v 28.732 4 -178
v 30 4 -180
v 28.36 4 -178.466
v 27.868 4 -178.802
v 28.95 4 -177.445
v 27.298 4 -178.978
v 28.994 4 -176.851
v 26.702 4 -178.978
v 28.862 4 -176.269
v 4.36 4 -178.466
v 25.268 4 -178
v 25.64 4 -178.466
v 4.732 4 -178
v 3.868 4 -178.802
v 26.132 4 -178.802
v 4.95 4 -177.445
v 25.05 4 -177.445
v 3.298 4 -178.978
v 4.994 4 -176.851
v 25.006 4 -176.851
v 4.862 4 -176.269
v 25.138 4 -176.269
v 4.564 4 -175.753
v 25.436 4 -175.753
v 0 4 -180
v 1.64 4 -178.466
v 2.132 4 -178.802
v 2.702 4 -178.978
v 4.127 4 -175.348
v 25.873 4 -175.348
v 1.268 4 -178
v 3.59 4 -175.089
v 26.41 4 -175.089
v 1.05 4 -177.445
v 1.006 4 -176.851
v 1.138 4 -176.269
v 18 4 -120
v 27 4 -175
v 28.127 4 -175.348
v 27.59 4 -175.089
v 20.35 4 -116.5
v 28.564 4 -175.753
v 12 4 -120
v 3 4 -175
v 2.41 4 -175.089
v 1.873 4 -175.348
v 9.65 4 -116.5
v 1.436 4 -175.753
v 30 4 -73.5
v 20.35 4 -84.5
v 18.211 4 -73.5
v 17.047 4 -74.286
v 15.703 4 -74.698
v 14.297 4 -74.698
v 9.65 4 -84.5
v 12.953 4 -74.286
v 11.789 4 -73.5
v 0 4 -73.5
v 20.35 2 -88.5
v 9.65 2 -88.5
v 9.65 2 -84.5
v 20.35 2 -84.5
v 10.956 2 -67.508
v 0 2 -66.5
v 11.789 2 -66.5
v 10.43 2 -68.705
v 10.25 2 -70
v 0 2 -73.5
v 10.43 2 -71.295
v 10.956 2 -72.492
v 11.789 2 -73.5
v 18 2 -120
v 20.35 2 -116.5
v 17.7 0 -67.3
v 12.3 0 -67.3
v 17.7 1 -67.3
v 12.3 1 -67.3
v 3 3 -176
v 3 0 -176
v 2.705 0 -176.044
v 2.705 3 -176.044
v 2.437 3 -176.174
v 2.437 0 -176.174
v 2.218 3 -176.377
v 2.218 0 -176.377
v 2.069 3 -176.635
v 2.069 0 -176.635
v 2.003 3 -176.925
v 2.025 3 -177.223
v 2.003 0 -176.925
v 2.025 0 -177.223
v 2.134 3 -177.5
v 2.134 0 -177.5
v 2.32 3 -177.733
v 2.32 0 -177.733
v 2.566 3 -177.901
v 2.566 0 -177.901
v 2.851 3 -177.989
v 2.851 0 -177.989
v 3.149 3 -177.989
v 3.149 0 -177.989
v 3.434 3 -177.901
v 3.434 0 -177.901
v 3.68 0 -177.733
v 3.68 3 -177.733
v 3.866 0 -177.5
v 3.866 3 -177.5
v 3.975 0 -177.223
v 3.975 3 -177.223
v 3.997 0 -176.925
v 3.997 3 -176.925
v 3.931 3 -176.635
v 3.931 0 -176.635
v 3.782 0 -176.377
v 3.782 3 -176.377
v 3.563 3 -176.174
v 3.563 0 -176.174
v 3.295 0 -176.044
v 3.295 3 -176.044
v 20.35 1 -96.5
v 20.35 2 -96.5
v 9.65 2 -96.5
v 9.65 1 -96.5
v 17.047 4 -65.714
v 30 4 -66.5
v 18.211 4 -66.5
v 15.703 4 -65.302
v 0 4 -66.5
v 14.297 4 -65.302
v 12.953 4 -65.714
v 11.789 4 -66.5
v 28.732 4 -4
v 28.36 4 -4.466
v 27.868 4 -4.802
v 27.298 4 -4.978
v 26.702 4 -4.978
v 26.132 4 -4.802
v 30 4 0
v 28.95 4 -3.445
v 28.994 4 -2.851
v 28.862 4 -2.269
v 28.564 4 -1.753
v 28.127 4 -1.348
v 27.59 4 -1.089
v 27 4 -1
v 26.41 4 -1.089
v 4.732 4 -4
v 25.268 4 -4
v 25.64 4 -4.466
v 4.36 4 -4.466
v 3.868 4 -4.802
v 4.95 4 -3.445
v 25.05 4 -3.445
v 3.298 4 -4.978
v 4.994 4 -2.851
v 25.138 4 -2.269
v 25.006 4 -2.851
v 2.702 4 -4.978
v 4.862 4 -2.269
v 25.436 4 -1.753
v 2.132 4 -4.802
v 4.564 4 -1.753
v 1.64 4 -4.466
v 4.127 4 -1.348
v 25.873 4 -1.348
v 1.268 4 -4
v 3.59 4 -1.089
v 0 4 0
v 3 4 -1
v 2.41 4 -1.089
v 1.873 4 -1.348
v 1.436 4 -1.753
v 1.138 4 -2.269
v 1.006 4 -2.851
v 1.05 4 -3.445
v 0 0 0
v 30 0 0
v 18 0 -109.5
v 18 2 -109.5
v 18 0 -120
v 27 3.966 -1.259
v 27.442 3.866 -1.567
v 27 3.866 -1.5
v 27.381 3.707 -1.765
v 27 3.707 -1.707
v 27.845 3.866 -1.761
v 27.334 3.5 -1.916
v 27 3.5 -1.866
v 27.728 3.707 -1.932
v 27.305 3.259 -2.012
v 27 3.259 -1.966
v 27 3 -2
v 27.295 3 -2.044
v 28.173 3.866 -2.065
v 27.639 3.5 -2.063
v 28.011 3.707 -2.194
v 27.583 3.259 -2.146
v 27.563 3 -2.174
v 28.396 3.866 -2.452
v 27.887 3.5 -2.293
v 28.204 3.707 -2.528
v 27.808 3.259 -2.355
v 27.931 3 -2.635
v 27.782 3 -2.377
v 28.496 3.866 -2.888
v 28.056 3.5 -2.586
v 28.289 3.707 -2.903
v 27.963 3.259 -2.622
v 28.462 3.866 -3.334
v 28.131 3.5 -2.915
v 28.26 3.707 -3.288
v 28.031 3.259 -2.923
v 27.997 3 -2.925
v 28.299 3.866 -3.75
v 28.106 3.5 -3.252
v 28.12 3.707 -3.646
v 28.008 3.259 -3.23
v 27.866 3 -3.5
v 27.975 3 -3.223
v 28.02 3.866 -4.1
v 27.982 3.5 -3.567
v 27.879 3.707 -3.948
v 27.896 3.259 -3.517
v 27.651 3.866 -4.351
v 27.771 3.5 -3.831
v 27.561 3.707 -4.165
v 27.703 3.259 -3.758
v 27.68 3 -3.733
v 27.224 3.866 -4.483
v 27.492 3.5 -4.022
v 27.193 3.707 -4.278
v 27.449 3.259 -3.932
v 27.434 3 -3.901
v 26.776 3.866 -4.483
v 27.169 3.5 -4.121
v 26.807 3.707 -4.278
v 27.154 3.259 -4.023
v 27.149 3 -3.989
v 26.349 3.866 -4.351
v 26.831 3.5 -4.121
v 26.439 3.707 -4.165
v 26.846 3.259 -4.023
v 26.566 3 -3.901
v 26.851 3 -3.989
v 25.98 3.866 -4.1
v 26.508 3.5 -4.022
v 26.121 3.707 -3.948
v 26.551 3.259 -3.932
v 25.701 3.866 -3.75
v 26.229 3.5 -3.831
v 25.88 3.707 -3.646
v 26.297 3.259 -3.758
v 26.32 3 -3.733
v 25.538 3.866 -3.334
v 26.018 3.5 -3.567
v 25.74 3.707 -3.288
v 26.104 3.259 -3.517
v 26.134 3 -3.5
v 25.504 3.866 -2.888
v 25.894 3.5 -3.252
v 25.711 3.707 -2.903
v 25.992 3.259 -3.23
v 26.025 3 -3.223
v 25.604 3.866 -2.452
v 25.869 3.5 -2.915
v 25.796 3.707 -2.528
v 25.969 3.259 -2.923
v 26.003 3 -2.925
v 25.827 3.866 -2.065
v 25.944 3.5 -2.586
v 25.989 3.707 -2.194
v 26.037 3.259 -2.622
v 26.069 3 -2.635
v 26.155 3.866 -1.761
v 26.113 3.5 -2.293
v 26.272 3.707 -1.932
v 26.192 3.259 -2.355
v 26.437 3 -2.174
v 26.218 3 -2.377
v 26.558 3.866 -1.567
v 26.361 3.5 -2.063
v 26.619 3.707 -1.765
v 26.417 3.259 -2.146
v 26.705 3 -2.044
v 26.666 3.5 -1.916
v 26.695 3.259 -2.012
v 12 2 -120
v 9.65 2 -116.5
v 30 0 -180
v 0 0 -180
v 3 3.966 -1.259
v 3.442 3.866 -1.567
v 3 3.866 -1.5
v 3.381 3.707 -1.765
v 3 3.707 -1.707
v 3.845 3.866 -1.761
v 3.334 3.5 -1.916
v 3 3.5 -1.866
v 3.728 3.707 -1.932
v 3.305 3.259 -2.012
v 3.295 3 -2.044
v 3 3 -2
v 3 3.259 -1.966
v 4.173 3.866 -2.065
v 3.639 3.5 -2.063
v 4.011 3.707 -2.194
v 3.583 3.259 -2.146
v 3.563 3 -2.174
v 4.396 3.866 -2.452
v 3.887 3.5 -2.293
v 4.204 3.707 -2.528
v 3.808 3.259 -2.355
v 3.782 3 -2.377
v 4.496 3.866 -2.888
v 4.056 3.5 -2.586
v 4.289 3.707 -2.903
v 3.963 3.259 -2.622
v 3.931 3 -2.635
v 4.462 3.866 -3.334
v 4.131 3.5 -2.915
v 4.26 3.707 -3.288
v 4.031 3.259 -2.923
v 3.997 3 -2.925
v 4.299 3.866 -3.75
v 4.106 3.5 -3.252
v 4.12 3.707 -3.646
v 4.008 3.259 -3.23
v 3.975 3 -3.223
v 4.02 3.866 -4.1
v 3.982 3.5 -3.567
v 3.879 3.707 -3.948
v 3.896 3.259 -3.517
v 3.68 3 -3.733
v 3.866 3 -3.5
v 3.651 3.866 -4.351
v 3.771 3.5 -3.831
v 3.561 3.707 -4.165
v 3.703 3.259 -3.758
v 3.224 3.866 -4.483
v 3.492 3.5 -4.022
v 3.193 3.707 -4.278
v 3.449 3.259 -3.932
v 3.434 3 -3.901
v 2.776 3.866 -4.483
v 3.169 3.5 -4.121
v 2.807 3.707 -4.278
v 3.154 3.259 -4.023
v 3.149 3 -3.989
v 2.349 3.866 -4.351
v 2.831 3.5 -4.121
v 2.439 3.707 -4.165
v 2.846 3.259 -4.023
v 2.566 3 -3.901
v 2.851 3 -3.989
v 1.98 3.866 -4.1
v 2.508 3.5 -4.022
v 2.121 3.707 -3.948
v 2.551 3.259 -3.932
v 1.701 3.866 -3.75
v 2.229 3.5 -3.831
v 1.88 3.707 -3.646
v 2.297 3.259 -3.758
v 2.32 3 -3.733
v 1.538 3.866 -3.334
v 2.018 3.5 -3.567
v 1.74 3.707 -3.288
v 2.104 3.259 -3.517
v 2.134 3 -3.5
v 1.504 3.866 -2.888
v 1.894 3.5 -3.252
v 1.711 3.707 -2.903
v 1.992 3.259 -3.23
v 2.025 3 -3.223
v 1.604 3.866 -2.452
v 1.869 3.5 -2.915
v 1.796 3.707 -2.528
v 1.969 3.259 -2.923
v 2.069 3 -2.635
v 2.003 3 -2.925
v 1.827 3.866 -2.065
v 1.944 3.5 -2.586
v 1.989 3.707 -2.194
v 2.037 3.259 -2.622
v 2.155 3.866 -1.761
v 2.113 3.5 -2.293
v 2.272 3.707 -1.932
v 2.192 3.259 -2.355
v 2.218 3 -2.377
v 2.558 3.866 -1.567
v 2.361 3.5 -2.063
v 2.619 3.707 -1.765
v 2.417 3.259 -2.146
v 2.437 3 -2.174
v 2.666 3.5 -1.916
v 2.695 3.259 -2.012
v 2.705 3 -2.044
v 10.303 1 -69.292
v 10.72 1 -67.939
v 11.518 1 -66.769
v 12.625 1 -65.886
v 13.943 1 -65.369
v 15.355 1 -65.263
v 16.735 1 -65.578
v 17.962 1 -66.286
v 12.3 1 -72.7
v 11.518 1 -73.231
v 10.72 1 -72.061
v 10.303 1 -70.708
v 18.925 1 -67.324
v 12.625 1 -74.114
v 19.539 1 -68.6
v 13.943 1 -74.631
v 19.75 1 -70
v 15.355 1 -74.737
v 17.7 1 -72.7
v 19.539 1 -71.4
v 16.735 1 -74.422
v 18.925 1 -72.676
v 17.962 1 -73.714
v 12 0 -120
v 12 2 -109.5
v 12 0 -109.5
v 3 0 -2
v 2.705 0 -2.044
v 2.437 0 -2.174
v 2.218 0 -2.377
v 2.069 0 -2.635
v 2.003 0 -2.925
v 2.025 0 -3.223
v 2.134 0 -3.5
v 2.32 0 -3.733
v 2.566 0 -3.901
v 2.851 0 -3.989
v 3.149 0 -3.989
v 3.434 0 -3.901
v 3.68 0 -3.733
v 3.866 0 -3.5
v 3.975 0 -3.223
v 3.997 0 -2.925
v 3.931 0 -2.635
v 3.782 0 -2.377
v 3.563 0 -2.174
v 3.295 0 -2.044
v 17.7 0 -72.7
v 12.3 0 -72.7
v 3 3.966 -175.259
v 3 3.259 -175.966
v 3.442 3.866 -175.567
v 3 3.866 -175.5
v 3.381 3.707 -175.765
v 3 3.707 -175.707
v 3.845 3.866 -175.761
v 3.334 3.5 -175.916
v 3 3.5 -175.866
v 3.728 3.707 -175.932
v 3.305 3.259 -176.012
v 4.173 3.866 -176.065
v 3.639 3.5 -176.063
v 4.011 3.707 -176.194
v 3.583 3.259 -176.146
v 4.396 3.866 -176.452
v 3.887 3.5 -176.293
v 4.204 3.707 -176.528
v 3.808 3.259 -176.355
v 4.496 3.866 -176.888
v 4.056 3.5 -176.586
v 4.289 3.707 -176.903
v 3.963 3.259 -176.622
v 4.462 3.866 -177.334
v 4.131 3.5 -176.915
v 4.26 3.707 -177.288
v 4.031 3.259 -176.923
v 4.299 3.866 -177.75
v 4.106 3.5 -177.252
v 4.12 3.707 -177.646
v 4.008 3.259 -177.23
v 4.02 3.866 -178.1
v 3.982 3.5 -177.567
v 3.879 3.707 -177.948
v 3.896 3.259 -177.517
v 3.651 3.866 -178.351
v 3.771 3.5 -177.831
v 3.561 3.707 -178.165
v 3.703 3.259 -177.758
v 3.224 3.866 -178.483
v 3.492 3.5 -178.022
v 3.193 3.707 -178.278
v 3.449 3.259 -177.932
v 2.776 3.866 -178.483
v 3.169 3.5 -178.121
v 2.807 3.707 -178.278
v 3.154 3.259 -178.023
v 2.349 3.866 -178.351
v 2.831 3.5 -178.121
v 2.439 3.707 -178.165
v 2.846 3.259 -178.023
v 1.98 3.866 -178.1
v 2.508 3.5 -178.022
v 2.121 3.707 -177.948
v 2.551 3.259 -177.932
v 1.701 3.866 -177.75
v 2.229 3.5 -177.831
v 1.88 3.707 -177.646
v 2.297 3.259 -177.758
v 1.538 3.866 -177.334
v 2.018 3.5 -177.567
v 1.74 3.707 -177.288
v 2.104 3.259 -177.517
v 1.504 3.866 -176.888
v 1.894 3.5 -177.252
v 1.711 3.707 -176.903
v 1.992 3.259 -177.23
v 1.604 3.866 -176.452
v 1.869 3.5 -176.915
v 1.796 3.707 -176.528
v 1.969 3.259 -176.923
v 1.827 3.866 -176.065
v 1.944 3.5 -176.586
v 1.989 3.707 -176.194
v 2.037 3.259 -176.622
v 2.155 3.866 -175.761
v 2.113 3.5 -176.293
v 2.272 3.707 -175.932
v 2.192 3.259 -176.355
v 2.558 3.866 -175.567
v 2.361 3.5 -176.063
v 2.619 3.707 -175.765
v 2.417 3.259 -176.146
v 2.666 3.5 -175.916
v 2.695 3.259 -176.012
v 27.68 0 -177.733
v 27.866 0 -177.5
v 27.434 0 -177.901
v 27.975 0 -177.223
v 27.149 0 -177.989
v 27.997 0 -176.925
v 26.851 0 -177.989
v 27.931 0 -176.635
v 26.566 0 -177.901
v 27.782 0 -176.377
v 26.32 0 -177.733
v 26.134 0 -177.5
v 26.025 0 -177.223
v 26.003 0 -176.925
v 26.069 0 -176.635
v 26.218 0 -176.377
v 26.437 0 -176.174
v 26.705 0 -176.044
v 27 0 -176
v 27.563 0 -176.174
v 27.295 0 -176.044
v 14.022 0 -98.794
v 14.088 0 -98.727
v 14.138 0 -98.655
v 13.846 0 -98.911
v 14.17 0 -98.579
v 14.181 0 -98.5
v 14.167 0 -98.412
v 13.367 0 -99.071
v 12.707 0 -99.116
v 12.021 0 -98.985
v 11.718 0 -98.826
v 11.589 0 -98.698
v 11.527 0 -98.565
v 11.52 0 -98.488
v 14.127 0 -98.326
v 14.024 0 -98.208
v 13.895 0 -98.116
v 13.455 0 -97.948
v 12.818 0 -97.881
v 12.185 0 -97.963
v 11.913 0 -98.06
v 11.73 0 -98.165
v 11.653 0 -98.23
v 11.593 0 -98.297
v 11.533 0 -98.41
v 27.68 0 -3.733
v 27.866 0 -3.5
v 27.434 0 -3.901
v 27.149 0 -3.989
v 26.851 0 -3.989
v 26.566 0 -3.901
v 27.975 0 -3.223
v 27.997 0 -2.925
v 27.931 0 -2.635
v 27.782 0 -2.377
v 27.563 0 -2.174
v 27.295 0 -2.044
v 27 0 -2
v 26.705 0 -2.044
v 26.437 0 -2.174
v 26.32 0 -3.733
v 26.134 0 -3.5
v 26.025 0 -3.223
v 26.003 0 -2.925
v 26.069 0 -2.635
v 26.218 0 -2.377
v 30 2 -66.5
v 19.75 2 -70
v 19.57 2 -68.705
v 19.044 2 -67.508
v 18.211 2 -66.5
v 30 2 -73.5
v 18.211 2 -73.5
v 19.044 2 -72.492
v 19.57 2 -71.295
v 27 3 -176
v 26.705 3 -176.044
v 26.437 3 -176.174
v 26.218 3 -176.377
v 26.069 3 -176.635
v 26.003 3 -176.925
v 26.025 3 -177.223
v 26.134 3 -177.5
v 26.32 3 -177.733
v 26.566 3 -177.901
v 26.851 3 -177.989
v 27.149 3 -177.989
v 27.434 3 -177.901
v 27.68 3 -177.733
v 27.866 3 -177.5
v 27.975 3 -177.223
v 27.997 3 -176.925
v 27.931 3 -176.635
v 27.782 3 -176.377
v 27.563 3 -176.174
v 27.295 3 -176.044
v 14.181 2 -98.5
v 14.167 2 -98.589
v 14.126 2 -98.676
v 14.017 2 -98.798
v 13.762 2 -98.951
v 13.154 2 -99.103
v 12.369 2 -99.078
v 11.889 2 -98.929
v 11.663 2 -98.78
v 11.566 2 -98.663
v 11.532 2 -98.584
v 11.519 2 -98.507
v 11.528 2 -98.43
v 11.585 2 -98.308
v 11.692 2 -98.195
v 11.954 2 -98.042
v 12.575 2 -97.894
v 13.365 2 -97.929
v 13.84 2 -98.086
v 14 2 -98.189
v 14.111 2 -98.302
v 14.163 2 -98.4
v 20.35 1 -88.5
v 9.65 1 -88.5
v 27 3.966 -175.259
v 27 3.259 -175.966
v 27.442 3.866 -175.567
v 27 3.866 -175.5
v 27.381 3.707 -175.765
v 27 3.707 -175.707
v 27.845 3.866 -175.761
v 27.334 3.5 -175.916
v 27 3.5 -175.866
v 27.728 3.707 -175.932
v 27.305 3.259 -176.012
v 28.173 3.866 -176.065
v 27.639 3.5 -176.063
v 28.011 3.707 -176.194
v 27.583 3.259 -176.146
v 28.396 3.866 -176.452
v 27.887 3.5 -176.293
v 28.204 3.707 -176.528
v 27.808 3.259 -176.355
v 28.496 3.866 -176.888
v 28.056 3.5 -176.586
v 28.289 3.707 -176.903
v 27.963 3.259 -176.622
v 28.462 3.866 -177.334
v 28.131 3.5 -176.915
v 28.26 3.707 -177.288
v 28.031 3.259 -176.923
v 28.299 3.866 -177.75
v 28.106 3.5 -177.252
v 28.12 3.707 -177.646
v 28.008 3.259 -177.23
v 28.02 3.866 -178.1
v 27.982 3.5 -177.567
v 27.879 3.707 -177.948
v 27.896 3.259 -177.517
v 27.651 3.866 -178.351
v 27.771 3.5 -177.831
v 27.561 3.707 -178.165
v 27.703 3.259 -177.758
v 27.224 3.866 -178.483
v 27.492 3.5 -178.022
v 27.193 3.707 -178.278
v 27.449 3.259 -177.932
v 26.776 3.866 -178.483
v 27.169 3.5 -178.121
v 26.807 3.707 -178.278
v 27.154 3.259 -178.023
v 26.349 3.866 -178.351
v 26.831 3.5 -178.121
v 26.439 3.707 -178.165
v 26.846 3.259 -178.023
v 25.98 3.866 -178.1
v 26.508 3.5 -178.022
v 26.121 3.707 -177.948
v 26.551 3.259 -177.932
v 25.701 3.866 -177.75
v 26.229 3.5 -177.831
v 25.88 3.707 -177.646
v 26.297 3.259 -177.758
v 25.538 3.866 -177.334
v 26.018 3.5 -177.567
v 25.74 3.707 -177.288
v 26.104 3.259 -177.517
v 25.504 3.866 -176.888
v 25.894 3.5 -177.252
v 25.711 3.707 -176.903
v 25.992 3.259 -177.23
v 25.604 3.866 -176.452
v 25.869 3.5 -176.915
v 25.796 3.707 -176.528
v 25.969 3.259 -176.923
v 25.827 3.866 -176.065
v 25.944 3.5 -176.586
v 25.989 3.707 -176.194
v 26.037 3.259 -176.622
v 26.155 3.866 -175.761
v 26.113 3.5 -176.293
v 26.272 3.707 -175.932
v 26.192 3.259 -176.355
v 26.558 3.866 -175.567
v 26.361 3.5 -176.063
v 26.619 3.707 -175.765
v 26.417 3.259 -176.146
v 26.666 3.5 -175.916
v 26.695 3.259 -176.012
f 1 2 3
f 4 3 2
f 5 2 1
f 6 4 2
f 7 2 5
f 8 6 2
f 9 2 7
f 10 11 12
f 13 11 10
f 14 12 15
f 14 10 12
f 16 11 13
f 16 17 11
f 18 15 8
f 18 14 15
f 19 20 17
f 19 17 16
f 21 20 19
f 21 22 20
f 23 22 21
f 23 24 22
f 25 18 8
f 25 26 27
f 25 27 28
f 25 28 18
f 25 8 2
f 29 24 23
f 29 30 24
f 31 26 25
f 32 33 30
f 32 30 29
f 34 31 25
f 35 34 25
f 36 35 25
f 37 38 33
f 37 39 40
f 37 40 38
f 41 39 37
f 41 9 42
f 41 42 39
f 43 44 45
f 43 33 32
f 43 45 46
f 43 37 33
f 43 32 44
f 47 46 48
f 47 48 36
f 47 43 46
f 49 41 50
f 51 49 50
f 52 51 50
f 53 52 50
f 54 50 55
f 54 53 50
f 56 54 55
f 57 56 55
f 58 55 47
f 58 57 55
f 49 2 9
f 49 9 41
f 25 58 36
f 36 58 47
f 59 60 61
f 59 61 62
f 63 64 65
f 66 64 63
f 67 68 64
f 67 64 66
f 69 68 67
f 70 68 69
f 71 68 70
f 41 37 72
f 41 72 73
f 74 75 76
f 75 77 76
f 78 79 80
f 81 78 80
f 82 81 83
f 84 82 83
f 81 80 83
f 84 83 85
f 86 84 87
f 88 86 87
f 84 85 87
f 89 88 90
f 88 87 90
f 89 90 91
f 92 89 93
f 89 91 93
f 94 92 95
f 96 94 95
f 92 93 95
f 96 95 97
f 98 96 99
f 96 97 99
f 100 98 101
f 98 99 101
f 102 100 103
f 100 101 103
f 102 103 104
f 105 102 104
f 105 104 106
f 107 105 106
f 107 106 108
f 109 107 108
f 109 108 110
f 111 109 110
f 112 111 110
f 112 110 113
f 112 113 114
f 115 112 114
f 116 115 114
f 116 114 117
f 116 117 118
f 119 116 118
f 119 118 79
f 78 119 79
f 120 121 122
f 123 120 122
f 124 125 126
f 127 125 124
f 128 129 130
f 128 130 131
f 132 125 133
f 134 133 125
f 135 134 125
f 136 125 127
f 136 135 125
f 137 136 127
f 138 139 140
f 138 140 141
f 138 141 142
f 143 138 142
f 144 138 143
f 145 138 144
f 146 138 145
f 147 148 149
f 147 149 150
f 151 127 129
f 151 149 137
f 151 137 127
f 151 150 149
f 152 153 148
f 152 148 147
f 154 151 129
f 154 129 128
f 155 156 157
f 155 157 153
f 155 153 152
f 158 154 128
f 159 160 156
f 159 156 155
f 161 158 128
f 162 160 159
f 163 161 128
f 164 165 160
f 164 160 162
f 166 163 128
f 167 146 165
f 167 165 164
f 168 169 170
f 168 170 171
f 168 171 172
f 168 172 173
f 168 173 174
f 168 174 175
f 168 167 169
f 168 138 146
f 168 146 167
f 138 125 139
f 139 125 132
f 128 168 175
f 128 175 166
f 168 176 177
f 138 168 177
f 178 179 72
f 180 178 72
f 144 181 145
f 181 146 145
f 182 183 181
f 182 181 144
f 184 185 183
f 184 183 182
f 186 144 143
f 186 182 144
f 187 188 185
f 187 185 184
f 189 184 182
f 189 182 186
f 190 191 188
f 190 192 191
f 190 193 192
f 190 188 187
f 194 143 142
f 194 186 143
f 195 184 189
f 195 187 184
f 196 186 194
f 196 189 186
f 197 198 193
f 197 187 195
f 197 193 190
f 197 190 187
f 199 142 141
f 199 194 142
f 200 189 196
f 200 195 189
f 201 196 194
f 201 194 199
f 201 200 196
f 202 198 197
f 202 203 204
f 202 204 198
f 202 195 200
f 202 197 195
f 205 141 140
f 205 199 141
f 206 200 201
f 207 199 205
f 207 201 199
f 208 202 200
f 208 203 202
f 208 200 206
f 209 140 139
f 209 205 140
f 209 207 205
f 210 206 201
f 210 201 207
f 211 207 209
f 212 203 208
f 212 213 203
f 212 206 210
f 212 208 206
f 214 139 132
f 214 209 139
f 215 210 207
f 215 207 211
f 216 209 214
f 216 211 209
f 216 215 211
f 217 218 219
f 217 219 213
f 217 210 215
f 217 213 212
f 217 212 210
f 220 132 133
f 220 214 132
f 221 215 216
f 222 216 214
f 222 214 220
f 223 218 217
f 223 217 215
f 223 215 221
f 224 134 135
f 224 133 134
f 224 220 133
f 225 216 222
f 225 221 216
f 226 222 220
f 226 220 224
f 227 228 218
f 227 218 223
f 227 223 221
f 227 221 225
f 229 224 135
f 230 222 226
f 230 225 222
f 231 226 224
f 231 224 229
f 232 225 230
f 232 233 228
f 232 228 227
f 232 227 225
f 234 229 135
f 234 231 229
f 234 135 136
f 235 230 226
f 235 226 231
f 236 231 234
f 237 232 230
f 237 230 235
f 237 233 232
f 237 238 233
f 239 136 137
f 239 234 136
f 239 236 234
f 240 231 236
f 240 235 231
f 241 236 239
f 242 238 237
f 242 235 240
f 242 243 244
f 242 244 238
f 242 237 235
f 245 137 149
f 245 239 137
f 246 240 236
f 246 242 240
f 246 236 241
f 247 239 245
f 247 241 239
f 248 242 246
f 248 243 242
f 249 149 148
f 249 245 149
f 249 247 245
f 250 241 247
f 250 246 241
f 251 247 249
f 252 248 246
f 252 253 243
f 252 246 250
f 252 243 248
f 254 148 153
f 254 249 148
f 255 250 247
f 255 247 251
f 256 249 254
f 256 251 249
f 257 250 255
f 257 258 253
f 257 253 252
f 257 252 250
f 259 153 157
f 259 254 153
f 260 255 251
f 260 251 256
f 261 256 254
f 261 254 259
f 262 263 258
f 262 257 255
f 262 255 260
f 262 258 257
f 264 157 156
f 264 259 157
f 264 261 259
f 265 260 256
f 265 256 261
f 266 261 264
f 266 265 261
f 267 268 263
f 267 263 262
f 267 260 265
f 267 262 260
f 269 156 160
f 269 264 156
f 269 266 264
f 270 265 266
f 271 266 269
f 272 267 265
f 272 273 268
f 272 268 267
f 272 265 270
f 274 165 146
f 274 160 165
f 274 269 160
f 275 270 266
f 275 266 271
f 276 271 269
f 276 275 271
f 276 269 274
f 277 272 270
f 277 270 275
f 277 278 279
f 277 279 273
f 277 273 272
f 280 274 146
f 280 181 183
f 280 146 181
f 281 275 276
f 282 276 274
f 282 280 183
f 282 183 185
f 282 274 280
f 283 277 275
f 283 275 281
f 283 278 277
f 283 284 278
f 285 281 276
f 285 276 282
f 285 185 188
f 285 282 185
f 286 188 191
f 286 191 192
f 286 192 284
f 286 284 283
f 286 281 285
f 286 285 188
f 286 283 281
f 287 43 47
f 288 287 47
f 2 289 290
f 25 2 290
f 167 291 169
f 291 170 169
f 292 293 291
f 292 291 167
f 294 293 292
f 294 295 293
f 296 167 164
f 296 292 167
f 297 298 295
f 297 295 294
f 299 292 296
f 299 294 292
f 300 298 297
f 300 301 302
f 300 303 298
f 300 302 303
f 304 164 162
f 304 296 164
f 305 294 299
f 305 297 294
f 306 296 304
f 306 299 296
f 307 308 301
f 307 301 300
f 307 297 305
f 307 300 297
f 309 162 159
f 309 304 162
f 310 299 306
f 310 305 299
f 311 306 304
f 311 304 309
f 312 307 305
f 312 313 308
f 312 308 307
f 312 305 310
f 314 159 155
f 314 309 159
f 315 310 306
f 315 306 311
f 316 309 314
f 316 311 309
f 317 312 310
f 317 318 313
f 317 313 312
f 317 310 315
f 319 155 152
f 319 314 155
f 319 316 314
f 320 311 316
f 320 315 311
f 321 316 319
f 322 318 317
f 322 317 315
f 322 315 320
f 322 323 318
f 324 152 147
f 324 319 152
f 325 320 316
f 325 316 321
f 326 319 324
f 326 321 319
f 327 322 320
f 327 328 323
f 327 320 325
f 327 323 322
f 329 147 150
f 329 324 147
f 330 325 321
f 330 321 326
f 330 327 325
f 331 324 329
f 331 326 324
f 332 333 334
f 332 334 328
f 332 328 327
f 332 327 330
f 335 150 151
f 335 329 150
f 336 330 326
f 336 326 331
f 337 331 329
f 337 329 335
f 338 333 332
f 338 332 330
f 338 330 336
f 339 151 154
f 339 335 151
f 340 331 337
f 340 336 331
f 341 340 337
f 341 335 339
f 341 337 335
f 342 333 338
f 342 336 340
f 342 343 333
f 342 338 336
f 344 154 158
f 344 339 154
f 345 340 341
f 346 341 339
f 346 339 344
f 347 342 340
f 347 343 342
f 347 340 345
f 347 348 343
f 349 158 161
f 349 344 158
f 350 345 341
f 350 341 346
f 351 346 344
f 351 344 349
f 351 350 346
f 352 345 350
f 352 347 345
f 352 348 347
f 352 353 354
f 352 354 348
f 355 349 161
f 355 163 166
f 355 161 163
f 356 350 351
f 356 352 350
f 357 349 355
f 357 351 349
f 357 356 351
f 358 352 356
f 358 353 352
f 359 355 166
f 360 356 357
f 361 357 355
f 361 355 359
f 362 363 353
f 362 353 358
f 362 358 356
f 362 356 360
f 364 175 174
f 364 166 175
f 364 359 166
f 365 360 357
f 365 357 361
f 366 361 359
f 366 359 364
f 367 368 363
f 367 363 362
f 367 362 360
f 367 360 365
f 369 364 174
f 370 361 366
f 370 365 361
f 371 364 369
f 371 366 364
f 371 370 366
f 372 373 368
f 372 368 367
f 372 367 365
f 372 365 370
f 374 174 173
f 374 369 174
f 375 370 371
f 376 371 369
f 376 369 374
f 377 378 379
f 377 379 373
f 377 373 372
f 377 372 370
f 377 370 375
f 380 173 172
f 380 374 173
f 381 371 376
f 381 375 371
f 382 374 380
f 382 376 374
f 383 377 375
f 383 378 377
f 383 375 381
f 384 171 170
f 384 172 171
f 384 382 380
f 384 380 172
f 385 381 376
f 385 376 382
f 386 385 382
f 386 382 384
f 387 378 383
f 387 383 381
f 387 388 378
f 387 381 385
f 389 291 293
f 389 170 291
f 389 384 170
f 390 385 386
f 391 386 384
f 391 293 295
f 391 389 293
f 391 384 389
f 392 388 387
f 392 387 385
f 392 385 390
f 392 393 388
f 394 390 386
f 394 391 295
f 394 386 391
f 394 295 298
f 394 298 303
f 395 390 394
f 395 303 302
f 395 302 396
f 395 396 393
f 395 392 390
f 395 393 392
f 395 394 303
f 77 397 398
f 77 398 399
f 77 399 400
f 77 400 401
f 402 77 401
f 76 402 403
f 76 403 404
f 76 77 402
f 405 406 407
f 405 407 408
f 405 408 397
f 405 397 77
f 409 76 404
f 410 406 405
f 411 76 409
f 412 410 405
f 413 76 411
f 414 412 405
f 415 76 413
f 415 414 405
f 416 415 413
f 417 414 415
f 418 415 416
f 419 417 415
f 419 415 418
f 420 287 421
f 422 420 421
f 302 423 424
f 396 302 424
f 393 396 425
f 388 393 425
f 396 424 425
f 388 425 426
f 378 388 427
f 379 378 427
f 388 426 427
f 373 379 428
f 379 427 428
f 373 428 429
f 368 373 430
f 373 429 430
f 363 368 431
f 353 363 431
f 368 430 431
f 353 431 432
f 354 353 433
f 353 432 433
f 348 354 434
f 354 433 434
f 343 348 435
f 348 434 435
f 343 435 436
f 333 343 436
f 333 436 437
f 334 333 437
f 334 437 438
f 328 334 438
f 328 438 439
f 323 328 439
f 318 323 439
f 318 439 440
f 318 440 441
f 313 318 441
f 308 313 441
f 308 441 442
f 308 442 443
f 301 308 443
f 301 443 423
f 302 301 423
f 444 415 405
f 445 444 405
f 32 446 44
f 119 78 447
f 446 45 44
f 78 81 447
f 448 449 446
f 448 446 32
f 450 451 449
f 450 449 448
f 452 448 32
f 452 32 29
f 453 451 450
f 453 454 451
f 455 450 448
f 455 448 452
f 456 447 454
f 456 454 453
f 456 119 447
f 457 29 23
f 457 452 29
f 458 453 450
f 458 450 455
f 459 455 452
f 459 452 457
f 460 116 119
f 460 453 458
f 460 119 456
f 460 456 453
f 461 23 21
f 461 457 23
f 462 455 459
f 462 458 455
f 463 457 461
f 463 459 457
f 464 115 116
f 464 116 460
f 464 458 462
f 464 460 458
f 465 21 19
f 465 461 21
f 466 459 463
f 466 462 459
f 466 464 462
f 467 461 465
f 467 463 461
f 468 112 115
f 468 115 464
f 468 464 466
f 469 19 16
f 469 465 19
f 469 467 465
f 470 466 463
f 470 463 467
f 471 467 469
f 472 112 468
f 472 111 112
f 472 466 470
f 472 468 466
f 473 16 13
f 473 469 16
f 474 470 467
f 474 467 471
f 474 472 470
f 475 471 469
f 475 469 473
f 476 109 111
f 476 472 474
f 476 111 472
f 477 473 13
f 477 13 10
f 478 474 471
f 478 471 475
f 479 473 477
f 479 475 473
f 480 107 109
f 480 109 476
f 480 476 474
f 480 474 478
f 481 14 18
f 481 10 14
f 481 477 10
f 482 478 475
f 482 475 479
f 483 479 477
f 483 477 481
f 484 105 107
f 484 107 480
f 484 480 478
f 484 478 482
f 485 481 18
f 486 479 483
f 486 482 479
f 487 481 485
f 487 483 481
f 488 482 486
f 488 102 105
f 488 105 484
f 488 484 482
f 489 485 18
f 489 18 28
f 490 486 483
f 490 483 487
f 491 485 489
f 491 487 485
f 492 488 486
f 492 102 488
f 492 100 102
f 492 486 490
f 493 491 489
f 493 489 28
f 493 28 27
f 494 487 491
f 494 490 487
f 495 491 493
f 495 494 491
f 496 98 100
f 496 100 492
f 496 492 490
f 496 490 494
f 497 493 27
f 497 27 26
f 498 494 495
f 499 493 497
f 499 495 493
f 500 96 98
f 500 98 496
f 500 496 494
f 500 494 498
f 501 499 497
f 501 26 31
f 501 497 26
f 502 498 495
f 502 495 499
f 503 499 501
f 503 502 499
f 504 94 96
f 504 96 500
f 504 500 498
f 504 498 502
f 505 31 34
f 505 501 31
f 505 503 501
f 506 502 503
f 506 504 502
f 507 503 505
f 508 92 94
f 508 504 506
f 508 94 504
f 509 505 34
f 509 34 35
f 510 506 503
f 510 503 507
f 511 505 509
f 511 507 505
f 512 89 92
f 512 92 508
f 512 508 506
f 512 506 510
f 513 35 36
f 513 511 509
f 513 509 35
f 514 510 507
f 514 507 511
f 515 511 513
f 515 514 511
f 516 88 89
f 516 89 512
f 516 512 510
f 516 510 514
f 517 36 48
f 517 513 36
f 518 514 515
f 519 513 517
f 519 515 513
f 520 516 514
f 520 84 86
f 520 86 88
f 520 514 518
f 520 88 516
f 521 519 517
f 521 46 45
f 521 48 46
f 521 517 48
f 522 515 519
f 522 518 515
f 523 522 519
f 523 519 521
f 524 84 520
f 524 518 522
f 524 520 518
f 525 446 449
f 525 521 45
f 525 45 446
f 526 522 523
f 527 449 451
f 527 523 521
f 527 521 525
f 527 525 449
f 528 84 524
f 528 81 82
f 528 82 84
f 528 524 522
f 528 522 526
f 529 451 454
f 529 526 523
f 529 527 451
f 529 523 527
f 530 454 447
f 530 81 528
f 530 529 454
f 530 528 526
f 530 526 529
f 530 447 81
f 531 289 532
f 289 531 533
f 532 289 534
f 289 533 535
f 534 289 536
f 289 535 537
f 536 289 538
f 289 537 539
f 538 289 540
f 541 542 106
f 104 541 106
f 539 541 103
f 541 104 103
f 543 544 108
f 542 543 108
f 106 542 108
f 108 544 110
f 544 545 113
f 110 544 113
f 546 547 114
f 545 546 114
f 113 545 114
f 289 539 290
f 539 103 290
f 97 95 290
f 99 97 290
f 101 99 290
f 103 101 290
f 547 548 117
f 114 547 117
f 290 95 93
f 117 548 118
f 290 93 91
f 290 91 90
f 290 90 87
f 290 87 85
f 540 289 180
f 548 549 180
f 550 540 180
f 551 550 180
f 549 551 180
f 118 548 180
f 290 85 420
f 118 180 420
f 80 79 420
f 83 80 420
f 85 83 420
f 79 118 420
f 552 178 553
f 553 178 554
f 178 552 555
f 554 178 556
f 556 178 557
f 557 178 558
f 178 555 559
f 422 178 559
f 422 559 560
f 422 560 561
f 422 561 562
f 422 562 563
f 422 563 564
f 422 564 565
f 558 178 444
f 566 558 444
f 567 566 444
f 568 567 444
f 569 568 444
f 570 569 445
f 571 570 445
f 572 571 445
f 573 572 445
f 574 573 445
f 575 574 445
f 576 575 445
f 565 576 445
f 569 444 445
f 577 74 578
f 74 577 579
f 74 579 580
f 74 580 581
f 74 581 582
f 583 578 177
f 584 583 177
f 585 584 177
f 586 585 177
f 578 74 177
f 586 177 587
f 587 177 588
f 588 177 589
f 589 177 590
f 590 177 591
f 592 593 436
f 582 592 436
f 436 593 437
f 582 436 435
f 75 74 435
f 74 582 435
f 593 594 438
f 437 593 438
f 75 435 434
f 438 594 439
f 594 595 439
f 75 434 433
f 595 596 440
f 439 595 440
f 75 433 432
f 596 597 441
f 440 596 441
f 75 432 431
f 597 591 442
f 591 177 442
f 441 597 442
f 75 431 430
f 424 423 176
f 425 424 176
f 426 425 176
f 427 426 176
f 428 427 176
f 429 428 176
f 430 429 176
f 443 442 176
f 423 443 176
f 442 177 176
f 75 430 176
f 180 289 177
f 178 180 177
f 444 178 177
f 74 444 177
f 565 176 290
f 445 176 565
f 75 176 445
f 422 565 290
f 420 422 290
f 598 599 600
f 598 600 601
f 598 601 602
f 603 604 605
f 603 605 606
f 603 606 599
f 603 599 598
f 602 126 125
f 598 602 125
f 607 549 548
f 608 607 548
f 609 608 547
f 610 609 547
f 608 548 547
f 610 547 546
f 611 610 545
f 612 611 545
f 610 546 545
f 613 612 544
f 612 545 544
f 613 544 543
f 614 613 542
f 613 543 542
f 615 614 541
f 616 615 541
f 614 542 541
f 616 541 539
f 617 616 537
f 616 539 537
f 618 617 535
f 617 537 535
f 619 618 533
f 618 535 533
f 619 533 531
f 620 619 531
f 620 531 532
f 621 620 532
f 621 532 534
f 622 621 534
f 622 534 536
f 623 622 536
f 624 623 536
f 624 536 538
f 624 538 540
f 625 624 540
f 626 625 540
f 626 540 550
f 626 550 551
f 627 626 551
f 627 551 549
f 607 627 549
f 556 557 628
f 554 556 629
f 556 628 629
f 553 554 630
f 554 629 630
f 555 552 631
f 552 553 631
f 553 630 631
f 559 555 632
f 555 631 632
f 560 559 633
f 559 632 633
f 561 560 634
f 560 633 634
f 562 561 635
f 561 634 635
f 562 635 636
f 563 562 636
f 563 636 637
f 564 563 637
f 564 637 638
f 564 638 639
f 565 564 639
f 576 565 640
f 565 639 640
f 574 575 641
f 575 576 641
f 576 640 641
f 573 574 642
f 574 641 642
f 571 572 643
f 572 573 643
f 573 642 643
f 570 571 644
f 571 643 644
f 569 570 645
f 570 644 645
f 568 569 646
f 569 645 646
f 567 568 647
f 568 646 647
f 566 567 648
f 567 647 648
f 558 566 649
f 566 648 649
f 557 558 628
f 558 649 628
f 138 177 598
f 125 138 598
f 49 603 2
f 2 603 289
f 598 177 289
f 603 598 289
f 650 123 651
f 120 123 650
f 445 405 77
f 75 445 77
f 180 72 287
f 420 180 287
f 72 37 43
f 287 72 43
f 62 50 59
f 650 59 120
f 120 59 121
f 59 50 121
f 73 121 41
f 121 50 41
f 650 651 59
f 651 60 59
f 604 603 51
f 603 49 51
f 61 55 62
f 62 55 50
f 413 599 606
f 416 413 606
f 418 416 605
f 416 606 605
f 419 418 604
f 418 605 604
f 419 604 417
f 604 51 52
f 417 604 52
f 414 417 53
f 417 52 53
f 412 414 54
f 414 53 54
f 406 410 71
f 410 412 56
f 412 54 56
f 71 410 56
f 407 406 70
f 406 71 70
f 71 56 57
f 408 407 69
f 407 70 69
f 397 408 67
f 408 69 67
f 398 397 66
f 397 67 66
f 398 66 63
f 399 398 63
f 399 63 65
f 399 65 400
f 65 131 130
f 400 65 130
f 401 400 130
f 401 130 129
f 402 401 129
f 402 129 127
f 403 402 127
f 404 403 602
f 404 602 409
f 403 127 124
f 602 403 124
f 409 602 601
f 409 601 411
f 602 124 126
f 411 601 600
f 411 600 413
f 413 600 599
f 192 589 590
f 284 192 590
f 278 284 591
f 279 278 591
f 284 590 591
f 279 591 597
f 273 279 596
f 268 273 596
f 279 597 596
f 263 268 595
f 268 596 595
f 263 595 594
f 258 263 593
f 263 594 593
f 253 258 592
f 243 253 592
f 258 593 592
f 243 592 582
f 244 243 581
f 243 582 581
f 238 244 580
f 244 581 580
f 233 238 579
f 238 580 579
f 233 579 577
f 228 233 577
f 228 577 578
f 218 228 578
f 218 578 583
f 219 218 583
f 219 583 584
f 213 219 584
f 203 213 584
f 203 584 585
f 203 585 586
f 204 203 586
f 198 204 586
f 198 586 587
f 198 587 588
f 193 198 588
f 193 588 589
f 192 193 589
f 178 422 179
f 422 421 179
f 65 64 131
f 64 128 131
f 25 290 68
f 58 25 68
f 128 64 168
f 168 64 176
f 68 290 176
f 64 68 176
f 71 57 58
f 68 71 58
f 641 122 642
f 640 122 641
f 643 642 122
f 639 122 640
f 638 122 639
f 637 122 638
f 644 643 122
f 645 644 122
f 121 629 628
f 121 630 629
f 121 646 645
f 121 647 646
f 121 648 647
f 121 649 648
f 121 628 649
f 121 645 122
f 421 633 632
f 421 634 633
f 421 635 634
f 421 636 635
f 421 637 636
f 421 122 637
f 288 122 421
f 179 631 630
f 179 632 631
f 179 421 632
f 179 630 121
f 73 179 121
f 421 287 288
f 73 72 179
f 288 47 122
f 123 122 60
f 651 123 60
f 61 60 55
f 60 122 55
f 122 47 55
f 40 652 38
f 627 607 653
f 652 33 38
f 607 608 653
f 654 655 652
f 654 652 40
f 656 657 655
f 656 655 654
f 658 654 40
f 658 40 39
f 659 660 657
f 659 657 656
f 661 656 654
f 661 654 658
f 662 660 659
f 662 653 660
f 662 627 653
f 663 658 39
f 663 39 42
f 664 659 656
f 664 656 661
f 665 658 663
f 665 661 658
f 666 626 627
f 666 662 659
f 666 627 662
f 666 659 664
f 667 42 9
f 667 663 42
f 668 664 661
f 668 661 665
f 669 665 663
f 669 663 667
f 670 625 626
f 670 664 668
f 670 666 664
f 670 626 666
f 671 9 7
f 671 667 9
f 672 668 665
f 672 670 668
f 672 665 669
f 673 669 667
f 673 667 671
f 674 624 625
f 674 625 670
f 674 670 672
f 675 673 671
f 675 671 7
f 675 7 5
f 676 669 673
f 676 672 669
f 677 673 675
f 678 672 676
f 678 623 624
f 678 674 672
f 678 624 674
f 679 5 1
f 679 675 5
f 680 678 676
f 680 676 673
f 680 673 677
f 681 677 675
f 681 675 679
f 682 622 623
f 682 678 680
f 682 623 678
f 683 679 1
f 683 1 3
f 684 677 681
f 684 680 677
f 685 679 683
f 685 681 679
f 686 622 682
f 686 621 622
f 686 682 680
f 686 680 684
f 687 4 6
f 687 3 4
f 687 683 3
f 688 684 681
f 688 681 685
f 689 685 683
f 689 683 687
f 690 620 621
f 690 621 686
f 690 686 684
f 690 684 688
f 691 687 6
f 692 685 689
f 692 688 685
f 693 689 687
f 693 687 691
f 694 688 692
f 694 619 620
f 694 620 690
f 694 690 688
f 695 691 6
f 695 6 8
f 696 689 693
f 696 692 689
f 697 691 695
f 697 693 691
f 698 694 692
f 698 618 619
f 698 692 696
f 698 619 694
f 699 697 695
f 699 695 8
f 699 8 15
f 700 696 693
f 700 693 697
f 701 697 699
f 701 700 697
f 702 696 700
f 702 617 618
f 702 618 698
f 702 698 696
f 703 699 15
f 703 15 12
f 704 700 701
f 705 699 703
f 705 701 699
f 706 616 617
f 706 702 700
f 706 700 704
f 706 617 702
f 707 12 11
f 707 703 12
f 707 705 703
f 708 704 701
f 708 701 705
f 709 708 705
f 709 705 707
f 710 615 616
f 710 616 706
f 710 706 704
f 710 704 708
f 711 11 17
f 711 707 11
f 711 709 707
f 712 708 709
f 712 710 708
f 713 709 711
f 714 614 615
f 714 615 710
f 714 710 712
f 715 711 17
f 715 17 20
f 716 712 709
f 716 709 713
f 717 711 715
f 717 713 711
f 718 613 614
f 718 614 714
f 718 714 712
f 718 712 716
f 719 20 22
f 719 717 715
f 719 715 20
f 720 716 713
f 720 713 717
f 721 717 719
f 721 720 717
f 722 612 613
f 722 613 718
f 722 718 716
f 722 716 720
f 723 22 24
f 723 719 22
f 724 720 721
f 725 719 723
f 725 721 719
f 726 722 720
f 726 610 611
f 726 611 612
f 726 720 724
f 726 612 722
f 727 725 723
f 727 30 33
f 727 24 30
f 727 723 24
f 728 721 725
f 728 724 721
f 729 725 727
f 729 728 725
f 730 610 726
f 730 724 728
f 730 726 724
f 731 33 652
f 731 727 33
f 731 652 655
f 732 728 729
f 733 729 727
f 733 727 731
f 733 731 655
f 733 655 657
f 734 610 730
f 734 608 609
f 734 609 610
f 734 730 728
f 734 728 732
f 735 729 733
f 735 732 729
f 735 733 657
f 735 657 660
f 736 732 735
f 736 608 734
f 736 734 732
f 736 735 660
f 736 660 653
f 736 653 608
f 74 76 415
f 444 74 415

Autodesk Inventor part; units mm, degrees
ref_plane "YZ Plane" through (0, 0, 0) normal (1, 0, 0) x (0, 1, 0)
ref_plane "XZ Plane" through (0, 0, 0) normal (0, 1, 0) x (-1, 0, 0)
ref_plane "XY Plane" through (0, 0, 0) normal (0, 0, 1) x (1, 0, 0)
sketch "Náčrt1" plane through (0, 0, 0) normal (0, 1, 0) x (-1, 0, 0)
  line L0 (0, 0) -> (-30, 0)
  line L1 (-30, 0) -> (-30, -180)
  line L2 (-30, -180) -> (0, -180)
  line L3 (0, -180) -> (0, 0)
  dimension "d0" = 30
  dimension "d1" = 180
extrude "Vysunutí1" add sketch "Náčrt1" along normal blind 4
sketch "Náčrt2" plane through (0, 4, 0) normal (0, 1, 0) x (1, 0, 0)
  line L0 (30, 0) -> (30, 180) projected
  line L1 (30, 180) -> (0, 180) projected
  line L2 (0, 180) -> (0, 0) projected
  line L3 (0, 0) -> (30, 0) projected
  line L4 (15, 0) -> (15, 180) construction
  line L5 (9.65, 84.5) -> (20.35, 84.5)
  line L6 (20.35, 84.5) -> (20.35, 120)
  line L7 (20.35, 120) -> (9.65, 120)
  line L8 (9.65, 120) -> (9.65, 84.5)
  line L9 (12, 109.5) -> (18, 109.5)
  line L10 (18, 109.5) -> (18, 120)
  line L11 (18, 120) -> (12, 120)
  line L12 (12, 120) -> (12, 109.5)
  line L13 (18, 120) -> (20.35, 116.5)
  line L14 (12, 120) -> (9.65, 116.5)
  dimension "d4" = 10.7
  dimension "d5" = 35.5
  dimension "d6" = 60
  dimension "d7" = 6
  dimension "d8" = 10.5
  dimension "d9" = 32
extrude "Vysunutí2" cut sketch "Náčrt2" against normal blind 2 contours L8 L14 L12 L9 L10 L13 L6 L5
extrude "Vysunutí3" cut sketch "Náčrt2" against normal blind 4 contours L7 L10 L9 L12
sketch "Náčrt3" plane through (0, 4, 0) normal (0, 1, 0) x (1, 0, 0)
  circle A0 centre (15, 70) radius 4.75
  line L0 (30, 0) -> (30, 180) projected
  line L1 (30, 180) -> (0, 180) projected
  line L2 (0, 180) -> (0, 0) projected
  line L3 (0, 0) -> (30, 0) projected
  line L4 (12, 120) -> (18, 120) projected
  line L5 (18, 120) -> (20.35, 116.5) projected
  line L6 (20.35, 116.5) -> (20.35, 84.5) projected
  line L7 (20.35, 84.5) -> (9.65, 84.5) projected
  line L8 (9.65, 84.5) -> (9.65, 116.5) projected
  line L9 (9.65, 116.5) -> (12, 120) projected
  line L10 (15, 0) -> (15, 180) construction
  line L11 (12.3, 67.3) -> (17.7, 67.3)
  line L12 (17.7, 67.3) -> (17.7, 72.7)
  line L13 (17.7, 72.7) -> (12.3, 72.7)
  line L14 (12.3, 72.7) -> (12.3, 67.3)
  line L15 (0, 66.5) -> (30, 66.5)
  line L16 (30, 66.5) -> (30, 73.5)
  line L17 (30, 73.5) -> (0, 73.5)
  line L18 (0, 73.5) -> (0, 66.5)
  point P0 (11.7887, 73.5)
  point P1 (11.7887, 66.5)
  point P2 (18.2113, 73.5)
  point P3 (18.2113, 66.5)
  dimension "d14" = 9.5
  dimension "d15" = 70
  dimension "d16" = 5.4
  dimension "d17" = 5.4
  dimension "d18" = 2.7
  dimension "d19" = 7
  dimension "d20" = 3.5
extrude "Vysunutí4" cut sketch "Náčrt3" against normal blind 2 contours A0 L17 L0 L15 | A0 L15 L2 L17
extrude "Vysunutí5" cut sketch "Náčrt3" against normal blind 3 contours A0 L15 L17 | L17 A0 | A0 L15
extrude "Vysunutí6" cut sketch "Náčrt3" against normal blind 4 contours L14 L13 L12 L11
sketch "Náčrt4" plane through (0, 2, 0) normal (0, 1, 0) x (1, 0, 0)
  line L0 (20.35, 116.5) -> (20.35, 84.5) construction
  line L1 (18, 120) -> (20.35, 116.5) construction
  line L2 (18, 109.5) -> (18, 120) construction
  line L3 (12, 109.5) -> (18, 109.5) construction
  line L4 (12, 120) -> (12, 109.5) construction
  line L5 (9.65, 116.5) -> (12, 120) construction
  line L6 (9.65, 84.5) -> (9.65, 116.5) construction
  line L7 (20.35, 84.5) -> (9.65, 84.5) construction
  line L8 (9.65, 88.5) -> (20.35, 88.5)
  line L9 (20.35, 88.5) -> (20.35, 96.5)
  line L10 (20.35, 96.5) -> (9.65, 96.5)
  line L11 (9.65, 96.5) -> (9.65, 88.5)
  ellipse E0 centre (12.85, 98.5) end of major axis (14.1807, 98.5) minor radius 0.6195
  point P0 (0, 0)
  dimension "d27" = 8
  dimension "d28" = 4
  dimension "d29" = 14
  dimension "d30" = 3.2
extrude "Vysunutí7" cut sketch "Náčrt4" against normal blind 4 contours E0
extrude "Vysunutí8" cut sketch "Náčrt4" against normal blind 1 contours L11 L10 L9 L8
sketch "Náčrt5" plane through (0, 4, 0) normal (0, 1, 0) x (1, 0, 0)
  line L0 (0, 0) -> (30, 0) projected
  line L1 (0, 66.5) -> (0, 0) projected
  line L2 (15, 0) -> (15, 180) construction
  line L3 (30, 180) -> (0, 180) construction
  line L4 (30, 0) -> (30, 180) construction
  line L5 (30, 90) -> (0, 90) construction
  point P0 (3, 3)
  point P1 (27, 3)
  point P2 (3, 177)
  point P3 (27, 177)
  dimension "d35" = 3
  dimension "d36" = 3
hole "Díra1" at (3, 4, -3) at (27, 4, -3) at (3, 4, -177) at (27, 4, -177) direction (0, -1, 0) diameter 2 end through all
fillet "Zaoblení1" radius 1 4 edges at (27, 4, -4) (3, 4, -4) (27, 4, -178) (3, 4, -178)
equation "\"d18\" = 0.5 * d16"
equation "\"d20\" = 0.5 * d19"
properties part number "BackboardV3"
